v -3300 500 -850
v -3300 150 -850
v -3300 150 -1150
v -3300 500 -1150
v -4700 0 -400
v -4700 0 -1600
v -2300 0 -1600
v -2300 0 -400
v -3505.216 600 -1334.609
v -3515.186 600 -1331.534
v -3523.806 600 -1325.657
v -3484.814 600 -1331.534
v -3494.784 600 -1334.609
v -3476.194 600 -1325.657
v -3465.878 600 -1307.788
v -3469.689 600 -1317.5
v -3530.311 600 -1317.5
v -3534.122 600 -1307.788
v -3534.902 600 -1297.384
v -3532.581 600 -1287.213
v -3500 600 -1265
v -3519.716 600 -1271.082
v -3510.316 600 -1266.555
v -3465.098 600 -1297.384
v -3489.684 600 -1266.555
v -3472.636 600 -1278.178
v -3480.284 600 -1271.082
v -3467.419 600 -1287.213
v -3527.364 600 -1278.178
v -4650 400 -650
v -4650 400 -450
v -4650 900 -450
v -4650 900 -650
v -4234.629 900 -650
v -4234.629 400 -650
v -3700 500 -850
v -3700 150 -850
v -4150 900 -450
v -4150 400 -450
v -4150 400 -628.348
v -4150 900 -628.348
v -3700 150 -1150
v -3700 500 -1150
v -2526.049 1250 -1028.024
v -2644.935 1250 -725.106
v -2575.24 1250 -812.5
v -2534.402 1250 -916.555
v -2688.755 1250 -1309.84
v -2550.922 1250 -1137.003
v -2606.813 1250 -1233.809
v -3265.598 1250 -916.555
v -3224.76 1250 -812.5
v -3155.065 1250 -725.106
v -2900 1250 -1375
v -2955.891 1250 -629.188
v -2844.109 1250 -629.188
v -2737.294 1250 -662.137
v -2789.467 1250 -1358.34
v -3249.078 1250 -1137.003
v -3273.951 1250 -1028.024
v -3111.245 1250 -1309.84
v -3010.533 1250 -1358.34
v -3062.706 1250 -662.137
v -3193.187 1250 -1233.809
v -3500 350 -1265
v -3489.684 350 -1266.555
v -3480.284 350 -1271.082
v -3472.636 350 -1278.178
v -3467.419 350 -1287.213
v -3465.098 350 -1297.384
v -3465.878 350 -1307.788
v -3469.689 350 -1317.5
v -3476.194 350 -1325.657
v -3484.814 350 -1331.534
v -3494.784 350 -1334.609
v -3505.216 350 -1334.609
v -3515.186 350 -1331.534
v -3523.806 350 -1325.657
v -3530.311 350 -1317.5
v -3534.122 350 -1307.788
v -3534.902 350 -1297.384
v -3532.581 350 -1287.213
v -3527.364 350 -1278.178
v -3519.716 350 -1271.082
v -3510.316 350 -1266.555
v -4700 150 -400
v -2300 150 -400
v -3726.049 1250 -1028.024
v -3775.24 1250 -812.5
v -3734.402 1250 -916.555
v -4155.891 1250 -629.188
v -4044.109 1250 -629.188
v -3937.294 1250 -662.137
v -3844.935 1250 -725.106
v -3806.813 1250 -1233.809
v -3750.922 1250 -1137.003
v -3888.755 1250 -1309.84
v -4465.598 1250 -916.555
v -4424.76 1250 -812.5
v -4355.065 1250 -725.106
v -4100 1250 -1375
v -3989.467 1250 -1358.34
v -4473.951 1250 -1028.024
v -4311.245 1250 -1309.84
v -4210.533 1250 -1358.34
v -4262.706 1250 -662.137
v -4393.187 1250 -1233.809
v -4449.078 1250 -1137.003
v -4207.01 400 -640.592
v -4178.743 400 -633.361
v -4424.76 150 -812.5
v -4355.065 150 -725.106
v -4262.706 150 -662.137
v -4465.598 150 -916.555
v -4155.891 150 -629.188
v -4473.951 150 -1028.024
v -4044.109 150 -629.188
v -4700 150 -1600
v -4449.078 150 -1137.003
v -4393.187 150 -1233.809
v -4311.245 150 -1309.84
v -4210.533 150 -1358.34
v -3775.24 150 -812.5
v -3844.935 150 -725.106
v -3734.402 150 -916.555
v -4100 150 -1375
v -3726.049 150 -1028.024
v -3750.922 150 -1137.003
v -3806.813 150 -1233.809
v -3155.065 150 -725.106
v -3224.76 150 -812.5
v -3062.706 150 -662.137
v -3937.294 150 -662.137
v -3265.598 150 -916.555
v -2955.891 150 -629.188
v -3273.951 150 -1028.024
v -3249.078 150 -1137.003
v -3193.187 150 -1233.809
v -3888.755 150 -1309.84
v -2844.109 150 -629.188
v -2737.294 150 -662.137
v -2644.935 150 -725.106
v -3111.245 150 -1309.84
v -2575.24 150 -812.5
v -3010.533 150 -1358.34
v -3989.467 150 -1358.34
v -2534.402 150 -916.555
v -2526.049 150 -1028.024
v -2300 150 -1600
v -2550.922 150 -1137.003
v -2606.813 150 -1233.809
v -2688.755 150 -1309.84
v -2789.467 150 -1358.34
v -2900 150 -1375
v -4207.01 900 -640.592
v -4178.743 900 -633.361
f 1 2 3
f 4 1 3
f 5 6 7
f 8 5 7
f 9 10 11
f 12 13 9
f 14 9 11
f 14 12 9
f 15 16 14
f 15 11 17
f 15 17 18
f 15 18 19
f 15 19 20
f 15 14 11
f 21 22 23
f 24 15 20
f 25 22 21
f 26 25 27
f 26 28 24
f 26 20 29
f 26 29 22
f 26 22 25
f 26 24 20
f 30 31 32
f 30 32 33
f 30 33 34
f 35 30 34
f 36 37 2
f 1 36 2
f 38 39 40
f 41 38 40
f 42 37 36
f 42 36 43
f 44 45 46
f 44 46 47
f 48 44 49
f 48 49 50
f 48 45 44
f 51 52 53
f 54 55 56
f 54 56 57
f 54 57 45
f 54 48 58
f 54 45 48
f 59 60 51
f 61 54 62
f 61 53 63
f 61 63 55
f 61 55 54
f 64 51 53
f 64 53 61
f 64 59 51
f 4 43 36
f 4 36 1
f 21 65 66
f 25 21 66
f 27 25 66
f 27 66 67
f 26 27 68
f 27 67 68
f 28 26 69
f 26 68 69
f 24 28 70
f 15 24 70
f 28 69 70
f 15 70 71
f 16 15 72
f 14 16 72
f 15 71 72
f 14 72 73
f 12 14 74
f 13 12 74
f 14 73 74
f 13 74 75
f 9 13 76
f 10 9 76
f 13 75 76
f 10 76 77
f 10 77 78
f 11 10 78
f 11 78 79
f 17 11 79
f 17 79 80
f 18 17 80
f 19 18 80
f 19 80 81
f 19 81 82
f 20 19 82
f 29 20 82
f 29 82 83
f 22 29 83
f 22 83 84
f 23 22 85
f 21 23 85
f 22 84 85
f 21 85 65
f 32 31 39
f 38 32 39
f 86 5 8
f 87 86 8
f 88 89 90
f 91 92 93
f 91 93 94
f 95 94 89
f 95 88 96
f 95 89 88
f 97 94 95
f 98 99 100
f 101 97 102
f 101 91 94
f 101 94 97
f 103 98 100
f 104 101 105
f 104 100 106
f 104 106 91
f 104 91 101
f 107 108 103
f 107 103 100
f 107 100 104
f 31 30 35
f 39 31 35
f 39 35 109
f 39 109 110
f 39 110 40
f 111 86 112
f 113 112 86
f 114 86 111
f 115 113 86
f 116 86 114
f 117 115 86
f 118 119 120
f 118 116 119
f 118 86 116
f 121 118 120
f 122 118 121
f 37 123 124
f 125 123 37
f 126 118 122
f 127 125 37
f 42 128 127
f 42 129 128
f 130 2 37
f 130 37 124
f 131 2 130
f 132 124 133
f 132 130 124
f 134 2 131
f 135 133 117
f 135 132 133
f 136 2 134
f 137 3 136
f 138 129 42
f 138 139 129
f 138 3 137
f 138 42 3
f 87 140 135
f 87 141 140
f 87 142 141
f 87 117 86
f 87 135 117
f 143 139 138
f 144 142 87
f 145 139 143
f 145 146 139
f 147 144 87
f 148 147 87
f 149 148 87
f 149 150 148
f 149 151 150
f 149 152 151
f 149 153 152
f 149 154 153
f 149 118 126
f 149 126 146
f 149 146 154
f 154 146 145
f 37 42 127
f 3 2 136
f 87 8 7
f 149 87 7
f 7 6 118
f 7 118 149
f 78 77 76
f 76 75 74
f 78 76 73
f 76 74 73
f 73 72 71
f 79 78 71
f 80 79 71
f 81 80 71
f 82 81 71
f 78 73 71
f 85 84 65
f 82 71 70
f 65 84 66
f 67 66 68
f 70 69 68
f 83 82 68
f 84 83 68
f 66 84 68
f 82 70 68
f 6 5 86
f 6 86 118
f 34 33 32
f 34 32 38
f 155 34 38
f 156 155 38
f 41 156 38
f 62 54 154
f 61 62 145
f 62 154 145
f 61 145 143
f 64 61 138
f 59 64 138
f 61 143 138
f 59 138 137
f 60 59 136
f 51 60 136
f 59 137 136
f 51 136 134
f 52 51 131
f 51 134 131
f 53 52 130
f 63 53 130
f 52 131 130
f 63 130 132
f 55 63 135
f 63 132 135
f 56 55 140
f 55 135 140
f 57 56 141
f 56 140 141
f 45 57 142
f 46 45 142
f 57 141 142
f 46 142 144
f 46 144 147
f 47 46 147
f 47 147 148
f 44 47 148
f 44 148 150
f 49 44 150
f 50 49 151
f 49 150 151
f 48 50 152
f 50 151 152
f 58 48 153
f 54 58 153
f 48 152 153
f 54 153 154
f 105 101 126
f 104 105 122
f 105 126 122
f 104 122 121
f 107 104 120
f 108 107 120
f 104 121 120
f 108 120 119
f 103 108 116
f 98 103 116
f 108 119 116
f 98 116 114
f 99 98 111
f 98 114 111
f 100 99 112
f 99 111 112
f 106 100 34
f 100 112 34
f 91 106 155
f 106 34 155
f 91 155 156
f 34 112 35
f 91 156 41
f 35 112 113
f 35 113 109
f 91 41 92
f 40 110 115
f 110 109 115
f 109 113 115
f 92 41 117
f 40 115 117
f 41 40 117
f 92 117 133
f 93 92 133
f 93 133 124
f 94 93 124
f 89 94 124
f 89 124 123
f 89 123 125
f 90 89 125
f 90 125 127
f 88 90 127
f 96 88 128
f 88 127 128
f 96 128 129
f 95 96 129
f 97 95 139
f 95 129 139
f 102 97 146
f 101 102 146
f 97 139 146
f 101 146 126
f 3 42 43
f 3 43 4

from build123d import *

# Parameters (mm, degrees)
SKETCH1_W           = 2400
SKETCH1_H           = 1200
BOSS_EXTRUDE1_DEPTH = 150
BOSS_EXTRUDE2_START = 150
SKETCH2_R           = 375
BOSS_EXTRUDE2_DEPTH = 1100
BOSS_EXTRUDE3_START = 150
SKETCH3_R           = 375
BOSS_EXTRUDE3_DEPTH = 1100
BOSS_EXTRUDE4_START = 150
SKETCH4_W           = 400
SKETCH4_H           = 300
BOSS_EXTRUDE4_DEPTH = 350
BOSS_EXTRUDE5_START = 400
SKETCH5_W           = 500
SKETCH5_H           = 200
BOSS_EXTRUDE5_DEPTH = 500
BOSS_EXTRUDE6_START = 350
SKETCH6_R           = 35
BOSS_EXTRUDE6_DEPTH = 250


with BuildPart() as part:
    # Sketch1 → Boss-Extrude1 (new body)
    with BuildSketch(Plane(origin=(0, 0, 0), x_dir=(1, 0, 0), z_dir=(0, 1, 0))):
        with Locations((-3500, 1000)):
            Rectangle(SKETCH1_W, SKETCH1_H)
    extrude(amount=BOSS_EXTRUDE1_DEPTH)

    # Sketch2 → Boss-Extrude2 (add)
    with BuildSketch(Plane(origin=(0, 0, 0), x_dir=(1, 0, 0), z_dir=(0, 1, 0)).offset(BOSS_EXTRUDE2_START)):
        with Locations(Location((-4100, 1000, 0), (0, 0, 90))):
            Circle(SKETCH2_R)
    extrude(amount=BOSS_EXTRUDE2_DEPTH)

    # Sketch3 → Boss-Extrude3 (add)
    with BuildSketch(Plane(origin=(0, 0, 0), x_dir=(1, 0, 0), z_dir=(0, 1, 0)).offset(BOSS_EXTRUDE3_START)):
        with Locations(Location((-2900, 1000, 0), (0, 0, 90))):
            Circle(SKETCH3_R)
    extrude(amount=BOSS_EXTRUDE3_DEPTH)

    # Sketch4 → Boss-Extrude4 (add)
    with BuildSketch(Plane(origin=(0, 0, 0), x_dir=(1, 0, 0), z_dir=(0, 1, 0)).offset(BOSS_EXTRUDE4_START)):
        with Locations((-3500, 1000)):
            Rectangle(SKETCH4_W, SKETCH4_H)
    extrude(amount=BOSS_EXTRUDE4_DEPTH)

    # Sketch5 → Boss-Extrude5 (add)
    with BuildSketch(Plane(origin=(0, 0, 0), x_dir=(1, 0, 0), z_dir=(0, 1, 0)).offset(BOSS_EXTRUDE5_START)):
        with Locations((-4400, 550)):
            Rectangle(SKETCH5_W, SKETCH5_H)
    extrude(amount=BOSS_EXTRUDE5_DEPTH)


with BuildPart() as body_2:
    # Sketch6 → Boss-Extrude6 (new body)
    with BuildSketch(Plane(origin=(0, 0, 0), x_dir=(1, 0, 0), z_dir=(0, 1, 0)).offset(BOSS_EXTRUDE6_START)):
        with Locations(Location((-3500, 1300, 0), (0, 0, 270))):
            Circle(SKETCH6_R)
    extrude(amount=BOSS_EXTRUDE6_DEPTH)


solid = Compound([part.part, body_2.part])
